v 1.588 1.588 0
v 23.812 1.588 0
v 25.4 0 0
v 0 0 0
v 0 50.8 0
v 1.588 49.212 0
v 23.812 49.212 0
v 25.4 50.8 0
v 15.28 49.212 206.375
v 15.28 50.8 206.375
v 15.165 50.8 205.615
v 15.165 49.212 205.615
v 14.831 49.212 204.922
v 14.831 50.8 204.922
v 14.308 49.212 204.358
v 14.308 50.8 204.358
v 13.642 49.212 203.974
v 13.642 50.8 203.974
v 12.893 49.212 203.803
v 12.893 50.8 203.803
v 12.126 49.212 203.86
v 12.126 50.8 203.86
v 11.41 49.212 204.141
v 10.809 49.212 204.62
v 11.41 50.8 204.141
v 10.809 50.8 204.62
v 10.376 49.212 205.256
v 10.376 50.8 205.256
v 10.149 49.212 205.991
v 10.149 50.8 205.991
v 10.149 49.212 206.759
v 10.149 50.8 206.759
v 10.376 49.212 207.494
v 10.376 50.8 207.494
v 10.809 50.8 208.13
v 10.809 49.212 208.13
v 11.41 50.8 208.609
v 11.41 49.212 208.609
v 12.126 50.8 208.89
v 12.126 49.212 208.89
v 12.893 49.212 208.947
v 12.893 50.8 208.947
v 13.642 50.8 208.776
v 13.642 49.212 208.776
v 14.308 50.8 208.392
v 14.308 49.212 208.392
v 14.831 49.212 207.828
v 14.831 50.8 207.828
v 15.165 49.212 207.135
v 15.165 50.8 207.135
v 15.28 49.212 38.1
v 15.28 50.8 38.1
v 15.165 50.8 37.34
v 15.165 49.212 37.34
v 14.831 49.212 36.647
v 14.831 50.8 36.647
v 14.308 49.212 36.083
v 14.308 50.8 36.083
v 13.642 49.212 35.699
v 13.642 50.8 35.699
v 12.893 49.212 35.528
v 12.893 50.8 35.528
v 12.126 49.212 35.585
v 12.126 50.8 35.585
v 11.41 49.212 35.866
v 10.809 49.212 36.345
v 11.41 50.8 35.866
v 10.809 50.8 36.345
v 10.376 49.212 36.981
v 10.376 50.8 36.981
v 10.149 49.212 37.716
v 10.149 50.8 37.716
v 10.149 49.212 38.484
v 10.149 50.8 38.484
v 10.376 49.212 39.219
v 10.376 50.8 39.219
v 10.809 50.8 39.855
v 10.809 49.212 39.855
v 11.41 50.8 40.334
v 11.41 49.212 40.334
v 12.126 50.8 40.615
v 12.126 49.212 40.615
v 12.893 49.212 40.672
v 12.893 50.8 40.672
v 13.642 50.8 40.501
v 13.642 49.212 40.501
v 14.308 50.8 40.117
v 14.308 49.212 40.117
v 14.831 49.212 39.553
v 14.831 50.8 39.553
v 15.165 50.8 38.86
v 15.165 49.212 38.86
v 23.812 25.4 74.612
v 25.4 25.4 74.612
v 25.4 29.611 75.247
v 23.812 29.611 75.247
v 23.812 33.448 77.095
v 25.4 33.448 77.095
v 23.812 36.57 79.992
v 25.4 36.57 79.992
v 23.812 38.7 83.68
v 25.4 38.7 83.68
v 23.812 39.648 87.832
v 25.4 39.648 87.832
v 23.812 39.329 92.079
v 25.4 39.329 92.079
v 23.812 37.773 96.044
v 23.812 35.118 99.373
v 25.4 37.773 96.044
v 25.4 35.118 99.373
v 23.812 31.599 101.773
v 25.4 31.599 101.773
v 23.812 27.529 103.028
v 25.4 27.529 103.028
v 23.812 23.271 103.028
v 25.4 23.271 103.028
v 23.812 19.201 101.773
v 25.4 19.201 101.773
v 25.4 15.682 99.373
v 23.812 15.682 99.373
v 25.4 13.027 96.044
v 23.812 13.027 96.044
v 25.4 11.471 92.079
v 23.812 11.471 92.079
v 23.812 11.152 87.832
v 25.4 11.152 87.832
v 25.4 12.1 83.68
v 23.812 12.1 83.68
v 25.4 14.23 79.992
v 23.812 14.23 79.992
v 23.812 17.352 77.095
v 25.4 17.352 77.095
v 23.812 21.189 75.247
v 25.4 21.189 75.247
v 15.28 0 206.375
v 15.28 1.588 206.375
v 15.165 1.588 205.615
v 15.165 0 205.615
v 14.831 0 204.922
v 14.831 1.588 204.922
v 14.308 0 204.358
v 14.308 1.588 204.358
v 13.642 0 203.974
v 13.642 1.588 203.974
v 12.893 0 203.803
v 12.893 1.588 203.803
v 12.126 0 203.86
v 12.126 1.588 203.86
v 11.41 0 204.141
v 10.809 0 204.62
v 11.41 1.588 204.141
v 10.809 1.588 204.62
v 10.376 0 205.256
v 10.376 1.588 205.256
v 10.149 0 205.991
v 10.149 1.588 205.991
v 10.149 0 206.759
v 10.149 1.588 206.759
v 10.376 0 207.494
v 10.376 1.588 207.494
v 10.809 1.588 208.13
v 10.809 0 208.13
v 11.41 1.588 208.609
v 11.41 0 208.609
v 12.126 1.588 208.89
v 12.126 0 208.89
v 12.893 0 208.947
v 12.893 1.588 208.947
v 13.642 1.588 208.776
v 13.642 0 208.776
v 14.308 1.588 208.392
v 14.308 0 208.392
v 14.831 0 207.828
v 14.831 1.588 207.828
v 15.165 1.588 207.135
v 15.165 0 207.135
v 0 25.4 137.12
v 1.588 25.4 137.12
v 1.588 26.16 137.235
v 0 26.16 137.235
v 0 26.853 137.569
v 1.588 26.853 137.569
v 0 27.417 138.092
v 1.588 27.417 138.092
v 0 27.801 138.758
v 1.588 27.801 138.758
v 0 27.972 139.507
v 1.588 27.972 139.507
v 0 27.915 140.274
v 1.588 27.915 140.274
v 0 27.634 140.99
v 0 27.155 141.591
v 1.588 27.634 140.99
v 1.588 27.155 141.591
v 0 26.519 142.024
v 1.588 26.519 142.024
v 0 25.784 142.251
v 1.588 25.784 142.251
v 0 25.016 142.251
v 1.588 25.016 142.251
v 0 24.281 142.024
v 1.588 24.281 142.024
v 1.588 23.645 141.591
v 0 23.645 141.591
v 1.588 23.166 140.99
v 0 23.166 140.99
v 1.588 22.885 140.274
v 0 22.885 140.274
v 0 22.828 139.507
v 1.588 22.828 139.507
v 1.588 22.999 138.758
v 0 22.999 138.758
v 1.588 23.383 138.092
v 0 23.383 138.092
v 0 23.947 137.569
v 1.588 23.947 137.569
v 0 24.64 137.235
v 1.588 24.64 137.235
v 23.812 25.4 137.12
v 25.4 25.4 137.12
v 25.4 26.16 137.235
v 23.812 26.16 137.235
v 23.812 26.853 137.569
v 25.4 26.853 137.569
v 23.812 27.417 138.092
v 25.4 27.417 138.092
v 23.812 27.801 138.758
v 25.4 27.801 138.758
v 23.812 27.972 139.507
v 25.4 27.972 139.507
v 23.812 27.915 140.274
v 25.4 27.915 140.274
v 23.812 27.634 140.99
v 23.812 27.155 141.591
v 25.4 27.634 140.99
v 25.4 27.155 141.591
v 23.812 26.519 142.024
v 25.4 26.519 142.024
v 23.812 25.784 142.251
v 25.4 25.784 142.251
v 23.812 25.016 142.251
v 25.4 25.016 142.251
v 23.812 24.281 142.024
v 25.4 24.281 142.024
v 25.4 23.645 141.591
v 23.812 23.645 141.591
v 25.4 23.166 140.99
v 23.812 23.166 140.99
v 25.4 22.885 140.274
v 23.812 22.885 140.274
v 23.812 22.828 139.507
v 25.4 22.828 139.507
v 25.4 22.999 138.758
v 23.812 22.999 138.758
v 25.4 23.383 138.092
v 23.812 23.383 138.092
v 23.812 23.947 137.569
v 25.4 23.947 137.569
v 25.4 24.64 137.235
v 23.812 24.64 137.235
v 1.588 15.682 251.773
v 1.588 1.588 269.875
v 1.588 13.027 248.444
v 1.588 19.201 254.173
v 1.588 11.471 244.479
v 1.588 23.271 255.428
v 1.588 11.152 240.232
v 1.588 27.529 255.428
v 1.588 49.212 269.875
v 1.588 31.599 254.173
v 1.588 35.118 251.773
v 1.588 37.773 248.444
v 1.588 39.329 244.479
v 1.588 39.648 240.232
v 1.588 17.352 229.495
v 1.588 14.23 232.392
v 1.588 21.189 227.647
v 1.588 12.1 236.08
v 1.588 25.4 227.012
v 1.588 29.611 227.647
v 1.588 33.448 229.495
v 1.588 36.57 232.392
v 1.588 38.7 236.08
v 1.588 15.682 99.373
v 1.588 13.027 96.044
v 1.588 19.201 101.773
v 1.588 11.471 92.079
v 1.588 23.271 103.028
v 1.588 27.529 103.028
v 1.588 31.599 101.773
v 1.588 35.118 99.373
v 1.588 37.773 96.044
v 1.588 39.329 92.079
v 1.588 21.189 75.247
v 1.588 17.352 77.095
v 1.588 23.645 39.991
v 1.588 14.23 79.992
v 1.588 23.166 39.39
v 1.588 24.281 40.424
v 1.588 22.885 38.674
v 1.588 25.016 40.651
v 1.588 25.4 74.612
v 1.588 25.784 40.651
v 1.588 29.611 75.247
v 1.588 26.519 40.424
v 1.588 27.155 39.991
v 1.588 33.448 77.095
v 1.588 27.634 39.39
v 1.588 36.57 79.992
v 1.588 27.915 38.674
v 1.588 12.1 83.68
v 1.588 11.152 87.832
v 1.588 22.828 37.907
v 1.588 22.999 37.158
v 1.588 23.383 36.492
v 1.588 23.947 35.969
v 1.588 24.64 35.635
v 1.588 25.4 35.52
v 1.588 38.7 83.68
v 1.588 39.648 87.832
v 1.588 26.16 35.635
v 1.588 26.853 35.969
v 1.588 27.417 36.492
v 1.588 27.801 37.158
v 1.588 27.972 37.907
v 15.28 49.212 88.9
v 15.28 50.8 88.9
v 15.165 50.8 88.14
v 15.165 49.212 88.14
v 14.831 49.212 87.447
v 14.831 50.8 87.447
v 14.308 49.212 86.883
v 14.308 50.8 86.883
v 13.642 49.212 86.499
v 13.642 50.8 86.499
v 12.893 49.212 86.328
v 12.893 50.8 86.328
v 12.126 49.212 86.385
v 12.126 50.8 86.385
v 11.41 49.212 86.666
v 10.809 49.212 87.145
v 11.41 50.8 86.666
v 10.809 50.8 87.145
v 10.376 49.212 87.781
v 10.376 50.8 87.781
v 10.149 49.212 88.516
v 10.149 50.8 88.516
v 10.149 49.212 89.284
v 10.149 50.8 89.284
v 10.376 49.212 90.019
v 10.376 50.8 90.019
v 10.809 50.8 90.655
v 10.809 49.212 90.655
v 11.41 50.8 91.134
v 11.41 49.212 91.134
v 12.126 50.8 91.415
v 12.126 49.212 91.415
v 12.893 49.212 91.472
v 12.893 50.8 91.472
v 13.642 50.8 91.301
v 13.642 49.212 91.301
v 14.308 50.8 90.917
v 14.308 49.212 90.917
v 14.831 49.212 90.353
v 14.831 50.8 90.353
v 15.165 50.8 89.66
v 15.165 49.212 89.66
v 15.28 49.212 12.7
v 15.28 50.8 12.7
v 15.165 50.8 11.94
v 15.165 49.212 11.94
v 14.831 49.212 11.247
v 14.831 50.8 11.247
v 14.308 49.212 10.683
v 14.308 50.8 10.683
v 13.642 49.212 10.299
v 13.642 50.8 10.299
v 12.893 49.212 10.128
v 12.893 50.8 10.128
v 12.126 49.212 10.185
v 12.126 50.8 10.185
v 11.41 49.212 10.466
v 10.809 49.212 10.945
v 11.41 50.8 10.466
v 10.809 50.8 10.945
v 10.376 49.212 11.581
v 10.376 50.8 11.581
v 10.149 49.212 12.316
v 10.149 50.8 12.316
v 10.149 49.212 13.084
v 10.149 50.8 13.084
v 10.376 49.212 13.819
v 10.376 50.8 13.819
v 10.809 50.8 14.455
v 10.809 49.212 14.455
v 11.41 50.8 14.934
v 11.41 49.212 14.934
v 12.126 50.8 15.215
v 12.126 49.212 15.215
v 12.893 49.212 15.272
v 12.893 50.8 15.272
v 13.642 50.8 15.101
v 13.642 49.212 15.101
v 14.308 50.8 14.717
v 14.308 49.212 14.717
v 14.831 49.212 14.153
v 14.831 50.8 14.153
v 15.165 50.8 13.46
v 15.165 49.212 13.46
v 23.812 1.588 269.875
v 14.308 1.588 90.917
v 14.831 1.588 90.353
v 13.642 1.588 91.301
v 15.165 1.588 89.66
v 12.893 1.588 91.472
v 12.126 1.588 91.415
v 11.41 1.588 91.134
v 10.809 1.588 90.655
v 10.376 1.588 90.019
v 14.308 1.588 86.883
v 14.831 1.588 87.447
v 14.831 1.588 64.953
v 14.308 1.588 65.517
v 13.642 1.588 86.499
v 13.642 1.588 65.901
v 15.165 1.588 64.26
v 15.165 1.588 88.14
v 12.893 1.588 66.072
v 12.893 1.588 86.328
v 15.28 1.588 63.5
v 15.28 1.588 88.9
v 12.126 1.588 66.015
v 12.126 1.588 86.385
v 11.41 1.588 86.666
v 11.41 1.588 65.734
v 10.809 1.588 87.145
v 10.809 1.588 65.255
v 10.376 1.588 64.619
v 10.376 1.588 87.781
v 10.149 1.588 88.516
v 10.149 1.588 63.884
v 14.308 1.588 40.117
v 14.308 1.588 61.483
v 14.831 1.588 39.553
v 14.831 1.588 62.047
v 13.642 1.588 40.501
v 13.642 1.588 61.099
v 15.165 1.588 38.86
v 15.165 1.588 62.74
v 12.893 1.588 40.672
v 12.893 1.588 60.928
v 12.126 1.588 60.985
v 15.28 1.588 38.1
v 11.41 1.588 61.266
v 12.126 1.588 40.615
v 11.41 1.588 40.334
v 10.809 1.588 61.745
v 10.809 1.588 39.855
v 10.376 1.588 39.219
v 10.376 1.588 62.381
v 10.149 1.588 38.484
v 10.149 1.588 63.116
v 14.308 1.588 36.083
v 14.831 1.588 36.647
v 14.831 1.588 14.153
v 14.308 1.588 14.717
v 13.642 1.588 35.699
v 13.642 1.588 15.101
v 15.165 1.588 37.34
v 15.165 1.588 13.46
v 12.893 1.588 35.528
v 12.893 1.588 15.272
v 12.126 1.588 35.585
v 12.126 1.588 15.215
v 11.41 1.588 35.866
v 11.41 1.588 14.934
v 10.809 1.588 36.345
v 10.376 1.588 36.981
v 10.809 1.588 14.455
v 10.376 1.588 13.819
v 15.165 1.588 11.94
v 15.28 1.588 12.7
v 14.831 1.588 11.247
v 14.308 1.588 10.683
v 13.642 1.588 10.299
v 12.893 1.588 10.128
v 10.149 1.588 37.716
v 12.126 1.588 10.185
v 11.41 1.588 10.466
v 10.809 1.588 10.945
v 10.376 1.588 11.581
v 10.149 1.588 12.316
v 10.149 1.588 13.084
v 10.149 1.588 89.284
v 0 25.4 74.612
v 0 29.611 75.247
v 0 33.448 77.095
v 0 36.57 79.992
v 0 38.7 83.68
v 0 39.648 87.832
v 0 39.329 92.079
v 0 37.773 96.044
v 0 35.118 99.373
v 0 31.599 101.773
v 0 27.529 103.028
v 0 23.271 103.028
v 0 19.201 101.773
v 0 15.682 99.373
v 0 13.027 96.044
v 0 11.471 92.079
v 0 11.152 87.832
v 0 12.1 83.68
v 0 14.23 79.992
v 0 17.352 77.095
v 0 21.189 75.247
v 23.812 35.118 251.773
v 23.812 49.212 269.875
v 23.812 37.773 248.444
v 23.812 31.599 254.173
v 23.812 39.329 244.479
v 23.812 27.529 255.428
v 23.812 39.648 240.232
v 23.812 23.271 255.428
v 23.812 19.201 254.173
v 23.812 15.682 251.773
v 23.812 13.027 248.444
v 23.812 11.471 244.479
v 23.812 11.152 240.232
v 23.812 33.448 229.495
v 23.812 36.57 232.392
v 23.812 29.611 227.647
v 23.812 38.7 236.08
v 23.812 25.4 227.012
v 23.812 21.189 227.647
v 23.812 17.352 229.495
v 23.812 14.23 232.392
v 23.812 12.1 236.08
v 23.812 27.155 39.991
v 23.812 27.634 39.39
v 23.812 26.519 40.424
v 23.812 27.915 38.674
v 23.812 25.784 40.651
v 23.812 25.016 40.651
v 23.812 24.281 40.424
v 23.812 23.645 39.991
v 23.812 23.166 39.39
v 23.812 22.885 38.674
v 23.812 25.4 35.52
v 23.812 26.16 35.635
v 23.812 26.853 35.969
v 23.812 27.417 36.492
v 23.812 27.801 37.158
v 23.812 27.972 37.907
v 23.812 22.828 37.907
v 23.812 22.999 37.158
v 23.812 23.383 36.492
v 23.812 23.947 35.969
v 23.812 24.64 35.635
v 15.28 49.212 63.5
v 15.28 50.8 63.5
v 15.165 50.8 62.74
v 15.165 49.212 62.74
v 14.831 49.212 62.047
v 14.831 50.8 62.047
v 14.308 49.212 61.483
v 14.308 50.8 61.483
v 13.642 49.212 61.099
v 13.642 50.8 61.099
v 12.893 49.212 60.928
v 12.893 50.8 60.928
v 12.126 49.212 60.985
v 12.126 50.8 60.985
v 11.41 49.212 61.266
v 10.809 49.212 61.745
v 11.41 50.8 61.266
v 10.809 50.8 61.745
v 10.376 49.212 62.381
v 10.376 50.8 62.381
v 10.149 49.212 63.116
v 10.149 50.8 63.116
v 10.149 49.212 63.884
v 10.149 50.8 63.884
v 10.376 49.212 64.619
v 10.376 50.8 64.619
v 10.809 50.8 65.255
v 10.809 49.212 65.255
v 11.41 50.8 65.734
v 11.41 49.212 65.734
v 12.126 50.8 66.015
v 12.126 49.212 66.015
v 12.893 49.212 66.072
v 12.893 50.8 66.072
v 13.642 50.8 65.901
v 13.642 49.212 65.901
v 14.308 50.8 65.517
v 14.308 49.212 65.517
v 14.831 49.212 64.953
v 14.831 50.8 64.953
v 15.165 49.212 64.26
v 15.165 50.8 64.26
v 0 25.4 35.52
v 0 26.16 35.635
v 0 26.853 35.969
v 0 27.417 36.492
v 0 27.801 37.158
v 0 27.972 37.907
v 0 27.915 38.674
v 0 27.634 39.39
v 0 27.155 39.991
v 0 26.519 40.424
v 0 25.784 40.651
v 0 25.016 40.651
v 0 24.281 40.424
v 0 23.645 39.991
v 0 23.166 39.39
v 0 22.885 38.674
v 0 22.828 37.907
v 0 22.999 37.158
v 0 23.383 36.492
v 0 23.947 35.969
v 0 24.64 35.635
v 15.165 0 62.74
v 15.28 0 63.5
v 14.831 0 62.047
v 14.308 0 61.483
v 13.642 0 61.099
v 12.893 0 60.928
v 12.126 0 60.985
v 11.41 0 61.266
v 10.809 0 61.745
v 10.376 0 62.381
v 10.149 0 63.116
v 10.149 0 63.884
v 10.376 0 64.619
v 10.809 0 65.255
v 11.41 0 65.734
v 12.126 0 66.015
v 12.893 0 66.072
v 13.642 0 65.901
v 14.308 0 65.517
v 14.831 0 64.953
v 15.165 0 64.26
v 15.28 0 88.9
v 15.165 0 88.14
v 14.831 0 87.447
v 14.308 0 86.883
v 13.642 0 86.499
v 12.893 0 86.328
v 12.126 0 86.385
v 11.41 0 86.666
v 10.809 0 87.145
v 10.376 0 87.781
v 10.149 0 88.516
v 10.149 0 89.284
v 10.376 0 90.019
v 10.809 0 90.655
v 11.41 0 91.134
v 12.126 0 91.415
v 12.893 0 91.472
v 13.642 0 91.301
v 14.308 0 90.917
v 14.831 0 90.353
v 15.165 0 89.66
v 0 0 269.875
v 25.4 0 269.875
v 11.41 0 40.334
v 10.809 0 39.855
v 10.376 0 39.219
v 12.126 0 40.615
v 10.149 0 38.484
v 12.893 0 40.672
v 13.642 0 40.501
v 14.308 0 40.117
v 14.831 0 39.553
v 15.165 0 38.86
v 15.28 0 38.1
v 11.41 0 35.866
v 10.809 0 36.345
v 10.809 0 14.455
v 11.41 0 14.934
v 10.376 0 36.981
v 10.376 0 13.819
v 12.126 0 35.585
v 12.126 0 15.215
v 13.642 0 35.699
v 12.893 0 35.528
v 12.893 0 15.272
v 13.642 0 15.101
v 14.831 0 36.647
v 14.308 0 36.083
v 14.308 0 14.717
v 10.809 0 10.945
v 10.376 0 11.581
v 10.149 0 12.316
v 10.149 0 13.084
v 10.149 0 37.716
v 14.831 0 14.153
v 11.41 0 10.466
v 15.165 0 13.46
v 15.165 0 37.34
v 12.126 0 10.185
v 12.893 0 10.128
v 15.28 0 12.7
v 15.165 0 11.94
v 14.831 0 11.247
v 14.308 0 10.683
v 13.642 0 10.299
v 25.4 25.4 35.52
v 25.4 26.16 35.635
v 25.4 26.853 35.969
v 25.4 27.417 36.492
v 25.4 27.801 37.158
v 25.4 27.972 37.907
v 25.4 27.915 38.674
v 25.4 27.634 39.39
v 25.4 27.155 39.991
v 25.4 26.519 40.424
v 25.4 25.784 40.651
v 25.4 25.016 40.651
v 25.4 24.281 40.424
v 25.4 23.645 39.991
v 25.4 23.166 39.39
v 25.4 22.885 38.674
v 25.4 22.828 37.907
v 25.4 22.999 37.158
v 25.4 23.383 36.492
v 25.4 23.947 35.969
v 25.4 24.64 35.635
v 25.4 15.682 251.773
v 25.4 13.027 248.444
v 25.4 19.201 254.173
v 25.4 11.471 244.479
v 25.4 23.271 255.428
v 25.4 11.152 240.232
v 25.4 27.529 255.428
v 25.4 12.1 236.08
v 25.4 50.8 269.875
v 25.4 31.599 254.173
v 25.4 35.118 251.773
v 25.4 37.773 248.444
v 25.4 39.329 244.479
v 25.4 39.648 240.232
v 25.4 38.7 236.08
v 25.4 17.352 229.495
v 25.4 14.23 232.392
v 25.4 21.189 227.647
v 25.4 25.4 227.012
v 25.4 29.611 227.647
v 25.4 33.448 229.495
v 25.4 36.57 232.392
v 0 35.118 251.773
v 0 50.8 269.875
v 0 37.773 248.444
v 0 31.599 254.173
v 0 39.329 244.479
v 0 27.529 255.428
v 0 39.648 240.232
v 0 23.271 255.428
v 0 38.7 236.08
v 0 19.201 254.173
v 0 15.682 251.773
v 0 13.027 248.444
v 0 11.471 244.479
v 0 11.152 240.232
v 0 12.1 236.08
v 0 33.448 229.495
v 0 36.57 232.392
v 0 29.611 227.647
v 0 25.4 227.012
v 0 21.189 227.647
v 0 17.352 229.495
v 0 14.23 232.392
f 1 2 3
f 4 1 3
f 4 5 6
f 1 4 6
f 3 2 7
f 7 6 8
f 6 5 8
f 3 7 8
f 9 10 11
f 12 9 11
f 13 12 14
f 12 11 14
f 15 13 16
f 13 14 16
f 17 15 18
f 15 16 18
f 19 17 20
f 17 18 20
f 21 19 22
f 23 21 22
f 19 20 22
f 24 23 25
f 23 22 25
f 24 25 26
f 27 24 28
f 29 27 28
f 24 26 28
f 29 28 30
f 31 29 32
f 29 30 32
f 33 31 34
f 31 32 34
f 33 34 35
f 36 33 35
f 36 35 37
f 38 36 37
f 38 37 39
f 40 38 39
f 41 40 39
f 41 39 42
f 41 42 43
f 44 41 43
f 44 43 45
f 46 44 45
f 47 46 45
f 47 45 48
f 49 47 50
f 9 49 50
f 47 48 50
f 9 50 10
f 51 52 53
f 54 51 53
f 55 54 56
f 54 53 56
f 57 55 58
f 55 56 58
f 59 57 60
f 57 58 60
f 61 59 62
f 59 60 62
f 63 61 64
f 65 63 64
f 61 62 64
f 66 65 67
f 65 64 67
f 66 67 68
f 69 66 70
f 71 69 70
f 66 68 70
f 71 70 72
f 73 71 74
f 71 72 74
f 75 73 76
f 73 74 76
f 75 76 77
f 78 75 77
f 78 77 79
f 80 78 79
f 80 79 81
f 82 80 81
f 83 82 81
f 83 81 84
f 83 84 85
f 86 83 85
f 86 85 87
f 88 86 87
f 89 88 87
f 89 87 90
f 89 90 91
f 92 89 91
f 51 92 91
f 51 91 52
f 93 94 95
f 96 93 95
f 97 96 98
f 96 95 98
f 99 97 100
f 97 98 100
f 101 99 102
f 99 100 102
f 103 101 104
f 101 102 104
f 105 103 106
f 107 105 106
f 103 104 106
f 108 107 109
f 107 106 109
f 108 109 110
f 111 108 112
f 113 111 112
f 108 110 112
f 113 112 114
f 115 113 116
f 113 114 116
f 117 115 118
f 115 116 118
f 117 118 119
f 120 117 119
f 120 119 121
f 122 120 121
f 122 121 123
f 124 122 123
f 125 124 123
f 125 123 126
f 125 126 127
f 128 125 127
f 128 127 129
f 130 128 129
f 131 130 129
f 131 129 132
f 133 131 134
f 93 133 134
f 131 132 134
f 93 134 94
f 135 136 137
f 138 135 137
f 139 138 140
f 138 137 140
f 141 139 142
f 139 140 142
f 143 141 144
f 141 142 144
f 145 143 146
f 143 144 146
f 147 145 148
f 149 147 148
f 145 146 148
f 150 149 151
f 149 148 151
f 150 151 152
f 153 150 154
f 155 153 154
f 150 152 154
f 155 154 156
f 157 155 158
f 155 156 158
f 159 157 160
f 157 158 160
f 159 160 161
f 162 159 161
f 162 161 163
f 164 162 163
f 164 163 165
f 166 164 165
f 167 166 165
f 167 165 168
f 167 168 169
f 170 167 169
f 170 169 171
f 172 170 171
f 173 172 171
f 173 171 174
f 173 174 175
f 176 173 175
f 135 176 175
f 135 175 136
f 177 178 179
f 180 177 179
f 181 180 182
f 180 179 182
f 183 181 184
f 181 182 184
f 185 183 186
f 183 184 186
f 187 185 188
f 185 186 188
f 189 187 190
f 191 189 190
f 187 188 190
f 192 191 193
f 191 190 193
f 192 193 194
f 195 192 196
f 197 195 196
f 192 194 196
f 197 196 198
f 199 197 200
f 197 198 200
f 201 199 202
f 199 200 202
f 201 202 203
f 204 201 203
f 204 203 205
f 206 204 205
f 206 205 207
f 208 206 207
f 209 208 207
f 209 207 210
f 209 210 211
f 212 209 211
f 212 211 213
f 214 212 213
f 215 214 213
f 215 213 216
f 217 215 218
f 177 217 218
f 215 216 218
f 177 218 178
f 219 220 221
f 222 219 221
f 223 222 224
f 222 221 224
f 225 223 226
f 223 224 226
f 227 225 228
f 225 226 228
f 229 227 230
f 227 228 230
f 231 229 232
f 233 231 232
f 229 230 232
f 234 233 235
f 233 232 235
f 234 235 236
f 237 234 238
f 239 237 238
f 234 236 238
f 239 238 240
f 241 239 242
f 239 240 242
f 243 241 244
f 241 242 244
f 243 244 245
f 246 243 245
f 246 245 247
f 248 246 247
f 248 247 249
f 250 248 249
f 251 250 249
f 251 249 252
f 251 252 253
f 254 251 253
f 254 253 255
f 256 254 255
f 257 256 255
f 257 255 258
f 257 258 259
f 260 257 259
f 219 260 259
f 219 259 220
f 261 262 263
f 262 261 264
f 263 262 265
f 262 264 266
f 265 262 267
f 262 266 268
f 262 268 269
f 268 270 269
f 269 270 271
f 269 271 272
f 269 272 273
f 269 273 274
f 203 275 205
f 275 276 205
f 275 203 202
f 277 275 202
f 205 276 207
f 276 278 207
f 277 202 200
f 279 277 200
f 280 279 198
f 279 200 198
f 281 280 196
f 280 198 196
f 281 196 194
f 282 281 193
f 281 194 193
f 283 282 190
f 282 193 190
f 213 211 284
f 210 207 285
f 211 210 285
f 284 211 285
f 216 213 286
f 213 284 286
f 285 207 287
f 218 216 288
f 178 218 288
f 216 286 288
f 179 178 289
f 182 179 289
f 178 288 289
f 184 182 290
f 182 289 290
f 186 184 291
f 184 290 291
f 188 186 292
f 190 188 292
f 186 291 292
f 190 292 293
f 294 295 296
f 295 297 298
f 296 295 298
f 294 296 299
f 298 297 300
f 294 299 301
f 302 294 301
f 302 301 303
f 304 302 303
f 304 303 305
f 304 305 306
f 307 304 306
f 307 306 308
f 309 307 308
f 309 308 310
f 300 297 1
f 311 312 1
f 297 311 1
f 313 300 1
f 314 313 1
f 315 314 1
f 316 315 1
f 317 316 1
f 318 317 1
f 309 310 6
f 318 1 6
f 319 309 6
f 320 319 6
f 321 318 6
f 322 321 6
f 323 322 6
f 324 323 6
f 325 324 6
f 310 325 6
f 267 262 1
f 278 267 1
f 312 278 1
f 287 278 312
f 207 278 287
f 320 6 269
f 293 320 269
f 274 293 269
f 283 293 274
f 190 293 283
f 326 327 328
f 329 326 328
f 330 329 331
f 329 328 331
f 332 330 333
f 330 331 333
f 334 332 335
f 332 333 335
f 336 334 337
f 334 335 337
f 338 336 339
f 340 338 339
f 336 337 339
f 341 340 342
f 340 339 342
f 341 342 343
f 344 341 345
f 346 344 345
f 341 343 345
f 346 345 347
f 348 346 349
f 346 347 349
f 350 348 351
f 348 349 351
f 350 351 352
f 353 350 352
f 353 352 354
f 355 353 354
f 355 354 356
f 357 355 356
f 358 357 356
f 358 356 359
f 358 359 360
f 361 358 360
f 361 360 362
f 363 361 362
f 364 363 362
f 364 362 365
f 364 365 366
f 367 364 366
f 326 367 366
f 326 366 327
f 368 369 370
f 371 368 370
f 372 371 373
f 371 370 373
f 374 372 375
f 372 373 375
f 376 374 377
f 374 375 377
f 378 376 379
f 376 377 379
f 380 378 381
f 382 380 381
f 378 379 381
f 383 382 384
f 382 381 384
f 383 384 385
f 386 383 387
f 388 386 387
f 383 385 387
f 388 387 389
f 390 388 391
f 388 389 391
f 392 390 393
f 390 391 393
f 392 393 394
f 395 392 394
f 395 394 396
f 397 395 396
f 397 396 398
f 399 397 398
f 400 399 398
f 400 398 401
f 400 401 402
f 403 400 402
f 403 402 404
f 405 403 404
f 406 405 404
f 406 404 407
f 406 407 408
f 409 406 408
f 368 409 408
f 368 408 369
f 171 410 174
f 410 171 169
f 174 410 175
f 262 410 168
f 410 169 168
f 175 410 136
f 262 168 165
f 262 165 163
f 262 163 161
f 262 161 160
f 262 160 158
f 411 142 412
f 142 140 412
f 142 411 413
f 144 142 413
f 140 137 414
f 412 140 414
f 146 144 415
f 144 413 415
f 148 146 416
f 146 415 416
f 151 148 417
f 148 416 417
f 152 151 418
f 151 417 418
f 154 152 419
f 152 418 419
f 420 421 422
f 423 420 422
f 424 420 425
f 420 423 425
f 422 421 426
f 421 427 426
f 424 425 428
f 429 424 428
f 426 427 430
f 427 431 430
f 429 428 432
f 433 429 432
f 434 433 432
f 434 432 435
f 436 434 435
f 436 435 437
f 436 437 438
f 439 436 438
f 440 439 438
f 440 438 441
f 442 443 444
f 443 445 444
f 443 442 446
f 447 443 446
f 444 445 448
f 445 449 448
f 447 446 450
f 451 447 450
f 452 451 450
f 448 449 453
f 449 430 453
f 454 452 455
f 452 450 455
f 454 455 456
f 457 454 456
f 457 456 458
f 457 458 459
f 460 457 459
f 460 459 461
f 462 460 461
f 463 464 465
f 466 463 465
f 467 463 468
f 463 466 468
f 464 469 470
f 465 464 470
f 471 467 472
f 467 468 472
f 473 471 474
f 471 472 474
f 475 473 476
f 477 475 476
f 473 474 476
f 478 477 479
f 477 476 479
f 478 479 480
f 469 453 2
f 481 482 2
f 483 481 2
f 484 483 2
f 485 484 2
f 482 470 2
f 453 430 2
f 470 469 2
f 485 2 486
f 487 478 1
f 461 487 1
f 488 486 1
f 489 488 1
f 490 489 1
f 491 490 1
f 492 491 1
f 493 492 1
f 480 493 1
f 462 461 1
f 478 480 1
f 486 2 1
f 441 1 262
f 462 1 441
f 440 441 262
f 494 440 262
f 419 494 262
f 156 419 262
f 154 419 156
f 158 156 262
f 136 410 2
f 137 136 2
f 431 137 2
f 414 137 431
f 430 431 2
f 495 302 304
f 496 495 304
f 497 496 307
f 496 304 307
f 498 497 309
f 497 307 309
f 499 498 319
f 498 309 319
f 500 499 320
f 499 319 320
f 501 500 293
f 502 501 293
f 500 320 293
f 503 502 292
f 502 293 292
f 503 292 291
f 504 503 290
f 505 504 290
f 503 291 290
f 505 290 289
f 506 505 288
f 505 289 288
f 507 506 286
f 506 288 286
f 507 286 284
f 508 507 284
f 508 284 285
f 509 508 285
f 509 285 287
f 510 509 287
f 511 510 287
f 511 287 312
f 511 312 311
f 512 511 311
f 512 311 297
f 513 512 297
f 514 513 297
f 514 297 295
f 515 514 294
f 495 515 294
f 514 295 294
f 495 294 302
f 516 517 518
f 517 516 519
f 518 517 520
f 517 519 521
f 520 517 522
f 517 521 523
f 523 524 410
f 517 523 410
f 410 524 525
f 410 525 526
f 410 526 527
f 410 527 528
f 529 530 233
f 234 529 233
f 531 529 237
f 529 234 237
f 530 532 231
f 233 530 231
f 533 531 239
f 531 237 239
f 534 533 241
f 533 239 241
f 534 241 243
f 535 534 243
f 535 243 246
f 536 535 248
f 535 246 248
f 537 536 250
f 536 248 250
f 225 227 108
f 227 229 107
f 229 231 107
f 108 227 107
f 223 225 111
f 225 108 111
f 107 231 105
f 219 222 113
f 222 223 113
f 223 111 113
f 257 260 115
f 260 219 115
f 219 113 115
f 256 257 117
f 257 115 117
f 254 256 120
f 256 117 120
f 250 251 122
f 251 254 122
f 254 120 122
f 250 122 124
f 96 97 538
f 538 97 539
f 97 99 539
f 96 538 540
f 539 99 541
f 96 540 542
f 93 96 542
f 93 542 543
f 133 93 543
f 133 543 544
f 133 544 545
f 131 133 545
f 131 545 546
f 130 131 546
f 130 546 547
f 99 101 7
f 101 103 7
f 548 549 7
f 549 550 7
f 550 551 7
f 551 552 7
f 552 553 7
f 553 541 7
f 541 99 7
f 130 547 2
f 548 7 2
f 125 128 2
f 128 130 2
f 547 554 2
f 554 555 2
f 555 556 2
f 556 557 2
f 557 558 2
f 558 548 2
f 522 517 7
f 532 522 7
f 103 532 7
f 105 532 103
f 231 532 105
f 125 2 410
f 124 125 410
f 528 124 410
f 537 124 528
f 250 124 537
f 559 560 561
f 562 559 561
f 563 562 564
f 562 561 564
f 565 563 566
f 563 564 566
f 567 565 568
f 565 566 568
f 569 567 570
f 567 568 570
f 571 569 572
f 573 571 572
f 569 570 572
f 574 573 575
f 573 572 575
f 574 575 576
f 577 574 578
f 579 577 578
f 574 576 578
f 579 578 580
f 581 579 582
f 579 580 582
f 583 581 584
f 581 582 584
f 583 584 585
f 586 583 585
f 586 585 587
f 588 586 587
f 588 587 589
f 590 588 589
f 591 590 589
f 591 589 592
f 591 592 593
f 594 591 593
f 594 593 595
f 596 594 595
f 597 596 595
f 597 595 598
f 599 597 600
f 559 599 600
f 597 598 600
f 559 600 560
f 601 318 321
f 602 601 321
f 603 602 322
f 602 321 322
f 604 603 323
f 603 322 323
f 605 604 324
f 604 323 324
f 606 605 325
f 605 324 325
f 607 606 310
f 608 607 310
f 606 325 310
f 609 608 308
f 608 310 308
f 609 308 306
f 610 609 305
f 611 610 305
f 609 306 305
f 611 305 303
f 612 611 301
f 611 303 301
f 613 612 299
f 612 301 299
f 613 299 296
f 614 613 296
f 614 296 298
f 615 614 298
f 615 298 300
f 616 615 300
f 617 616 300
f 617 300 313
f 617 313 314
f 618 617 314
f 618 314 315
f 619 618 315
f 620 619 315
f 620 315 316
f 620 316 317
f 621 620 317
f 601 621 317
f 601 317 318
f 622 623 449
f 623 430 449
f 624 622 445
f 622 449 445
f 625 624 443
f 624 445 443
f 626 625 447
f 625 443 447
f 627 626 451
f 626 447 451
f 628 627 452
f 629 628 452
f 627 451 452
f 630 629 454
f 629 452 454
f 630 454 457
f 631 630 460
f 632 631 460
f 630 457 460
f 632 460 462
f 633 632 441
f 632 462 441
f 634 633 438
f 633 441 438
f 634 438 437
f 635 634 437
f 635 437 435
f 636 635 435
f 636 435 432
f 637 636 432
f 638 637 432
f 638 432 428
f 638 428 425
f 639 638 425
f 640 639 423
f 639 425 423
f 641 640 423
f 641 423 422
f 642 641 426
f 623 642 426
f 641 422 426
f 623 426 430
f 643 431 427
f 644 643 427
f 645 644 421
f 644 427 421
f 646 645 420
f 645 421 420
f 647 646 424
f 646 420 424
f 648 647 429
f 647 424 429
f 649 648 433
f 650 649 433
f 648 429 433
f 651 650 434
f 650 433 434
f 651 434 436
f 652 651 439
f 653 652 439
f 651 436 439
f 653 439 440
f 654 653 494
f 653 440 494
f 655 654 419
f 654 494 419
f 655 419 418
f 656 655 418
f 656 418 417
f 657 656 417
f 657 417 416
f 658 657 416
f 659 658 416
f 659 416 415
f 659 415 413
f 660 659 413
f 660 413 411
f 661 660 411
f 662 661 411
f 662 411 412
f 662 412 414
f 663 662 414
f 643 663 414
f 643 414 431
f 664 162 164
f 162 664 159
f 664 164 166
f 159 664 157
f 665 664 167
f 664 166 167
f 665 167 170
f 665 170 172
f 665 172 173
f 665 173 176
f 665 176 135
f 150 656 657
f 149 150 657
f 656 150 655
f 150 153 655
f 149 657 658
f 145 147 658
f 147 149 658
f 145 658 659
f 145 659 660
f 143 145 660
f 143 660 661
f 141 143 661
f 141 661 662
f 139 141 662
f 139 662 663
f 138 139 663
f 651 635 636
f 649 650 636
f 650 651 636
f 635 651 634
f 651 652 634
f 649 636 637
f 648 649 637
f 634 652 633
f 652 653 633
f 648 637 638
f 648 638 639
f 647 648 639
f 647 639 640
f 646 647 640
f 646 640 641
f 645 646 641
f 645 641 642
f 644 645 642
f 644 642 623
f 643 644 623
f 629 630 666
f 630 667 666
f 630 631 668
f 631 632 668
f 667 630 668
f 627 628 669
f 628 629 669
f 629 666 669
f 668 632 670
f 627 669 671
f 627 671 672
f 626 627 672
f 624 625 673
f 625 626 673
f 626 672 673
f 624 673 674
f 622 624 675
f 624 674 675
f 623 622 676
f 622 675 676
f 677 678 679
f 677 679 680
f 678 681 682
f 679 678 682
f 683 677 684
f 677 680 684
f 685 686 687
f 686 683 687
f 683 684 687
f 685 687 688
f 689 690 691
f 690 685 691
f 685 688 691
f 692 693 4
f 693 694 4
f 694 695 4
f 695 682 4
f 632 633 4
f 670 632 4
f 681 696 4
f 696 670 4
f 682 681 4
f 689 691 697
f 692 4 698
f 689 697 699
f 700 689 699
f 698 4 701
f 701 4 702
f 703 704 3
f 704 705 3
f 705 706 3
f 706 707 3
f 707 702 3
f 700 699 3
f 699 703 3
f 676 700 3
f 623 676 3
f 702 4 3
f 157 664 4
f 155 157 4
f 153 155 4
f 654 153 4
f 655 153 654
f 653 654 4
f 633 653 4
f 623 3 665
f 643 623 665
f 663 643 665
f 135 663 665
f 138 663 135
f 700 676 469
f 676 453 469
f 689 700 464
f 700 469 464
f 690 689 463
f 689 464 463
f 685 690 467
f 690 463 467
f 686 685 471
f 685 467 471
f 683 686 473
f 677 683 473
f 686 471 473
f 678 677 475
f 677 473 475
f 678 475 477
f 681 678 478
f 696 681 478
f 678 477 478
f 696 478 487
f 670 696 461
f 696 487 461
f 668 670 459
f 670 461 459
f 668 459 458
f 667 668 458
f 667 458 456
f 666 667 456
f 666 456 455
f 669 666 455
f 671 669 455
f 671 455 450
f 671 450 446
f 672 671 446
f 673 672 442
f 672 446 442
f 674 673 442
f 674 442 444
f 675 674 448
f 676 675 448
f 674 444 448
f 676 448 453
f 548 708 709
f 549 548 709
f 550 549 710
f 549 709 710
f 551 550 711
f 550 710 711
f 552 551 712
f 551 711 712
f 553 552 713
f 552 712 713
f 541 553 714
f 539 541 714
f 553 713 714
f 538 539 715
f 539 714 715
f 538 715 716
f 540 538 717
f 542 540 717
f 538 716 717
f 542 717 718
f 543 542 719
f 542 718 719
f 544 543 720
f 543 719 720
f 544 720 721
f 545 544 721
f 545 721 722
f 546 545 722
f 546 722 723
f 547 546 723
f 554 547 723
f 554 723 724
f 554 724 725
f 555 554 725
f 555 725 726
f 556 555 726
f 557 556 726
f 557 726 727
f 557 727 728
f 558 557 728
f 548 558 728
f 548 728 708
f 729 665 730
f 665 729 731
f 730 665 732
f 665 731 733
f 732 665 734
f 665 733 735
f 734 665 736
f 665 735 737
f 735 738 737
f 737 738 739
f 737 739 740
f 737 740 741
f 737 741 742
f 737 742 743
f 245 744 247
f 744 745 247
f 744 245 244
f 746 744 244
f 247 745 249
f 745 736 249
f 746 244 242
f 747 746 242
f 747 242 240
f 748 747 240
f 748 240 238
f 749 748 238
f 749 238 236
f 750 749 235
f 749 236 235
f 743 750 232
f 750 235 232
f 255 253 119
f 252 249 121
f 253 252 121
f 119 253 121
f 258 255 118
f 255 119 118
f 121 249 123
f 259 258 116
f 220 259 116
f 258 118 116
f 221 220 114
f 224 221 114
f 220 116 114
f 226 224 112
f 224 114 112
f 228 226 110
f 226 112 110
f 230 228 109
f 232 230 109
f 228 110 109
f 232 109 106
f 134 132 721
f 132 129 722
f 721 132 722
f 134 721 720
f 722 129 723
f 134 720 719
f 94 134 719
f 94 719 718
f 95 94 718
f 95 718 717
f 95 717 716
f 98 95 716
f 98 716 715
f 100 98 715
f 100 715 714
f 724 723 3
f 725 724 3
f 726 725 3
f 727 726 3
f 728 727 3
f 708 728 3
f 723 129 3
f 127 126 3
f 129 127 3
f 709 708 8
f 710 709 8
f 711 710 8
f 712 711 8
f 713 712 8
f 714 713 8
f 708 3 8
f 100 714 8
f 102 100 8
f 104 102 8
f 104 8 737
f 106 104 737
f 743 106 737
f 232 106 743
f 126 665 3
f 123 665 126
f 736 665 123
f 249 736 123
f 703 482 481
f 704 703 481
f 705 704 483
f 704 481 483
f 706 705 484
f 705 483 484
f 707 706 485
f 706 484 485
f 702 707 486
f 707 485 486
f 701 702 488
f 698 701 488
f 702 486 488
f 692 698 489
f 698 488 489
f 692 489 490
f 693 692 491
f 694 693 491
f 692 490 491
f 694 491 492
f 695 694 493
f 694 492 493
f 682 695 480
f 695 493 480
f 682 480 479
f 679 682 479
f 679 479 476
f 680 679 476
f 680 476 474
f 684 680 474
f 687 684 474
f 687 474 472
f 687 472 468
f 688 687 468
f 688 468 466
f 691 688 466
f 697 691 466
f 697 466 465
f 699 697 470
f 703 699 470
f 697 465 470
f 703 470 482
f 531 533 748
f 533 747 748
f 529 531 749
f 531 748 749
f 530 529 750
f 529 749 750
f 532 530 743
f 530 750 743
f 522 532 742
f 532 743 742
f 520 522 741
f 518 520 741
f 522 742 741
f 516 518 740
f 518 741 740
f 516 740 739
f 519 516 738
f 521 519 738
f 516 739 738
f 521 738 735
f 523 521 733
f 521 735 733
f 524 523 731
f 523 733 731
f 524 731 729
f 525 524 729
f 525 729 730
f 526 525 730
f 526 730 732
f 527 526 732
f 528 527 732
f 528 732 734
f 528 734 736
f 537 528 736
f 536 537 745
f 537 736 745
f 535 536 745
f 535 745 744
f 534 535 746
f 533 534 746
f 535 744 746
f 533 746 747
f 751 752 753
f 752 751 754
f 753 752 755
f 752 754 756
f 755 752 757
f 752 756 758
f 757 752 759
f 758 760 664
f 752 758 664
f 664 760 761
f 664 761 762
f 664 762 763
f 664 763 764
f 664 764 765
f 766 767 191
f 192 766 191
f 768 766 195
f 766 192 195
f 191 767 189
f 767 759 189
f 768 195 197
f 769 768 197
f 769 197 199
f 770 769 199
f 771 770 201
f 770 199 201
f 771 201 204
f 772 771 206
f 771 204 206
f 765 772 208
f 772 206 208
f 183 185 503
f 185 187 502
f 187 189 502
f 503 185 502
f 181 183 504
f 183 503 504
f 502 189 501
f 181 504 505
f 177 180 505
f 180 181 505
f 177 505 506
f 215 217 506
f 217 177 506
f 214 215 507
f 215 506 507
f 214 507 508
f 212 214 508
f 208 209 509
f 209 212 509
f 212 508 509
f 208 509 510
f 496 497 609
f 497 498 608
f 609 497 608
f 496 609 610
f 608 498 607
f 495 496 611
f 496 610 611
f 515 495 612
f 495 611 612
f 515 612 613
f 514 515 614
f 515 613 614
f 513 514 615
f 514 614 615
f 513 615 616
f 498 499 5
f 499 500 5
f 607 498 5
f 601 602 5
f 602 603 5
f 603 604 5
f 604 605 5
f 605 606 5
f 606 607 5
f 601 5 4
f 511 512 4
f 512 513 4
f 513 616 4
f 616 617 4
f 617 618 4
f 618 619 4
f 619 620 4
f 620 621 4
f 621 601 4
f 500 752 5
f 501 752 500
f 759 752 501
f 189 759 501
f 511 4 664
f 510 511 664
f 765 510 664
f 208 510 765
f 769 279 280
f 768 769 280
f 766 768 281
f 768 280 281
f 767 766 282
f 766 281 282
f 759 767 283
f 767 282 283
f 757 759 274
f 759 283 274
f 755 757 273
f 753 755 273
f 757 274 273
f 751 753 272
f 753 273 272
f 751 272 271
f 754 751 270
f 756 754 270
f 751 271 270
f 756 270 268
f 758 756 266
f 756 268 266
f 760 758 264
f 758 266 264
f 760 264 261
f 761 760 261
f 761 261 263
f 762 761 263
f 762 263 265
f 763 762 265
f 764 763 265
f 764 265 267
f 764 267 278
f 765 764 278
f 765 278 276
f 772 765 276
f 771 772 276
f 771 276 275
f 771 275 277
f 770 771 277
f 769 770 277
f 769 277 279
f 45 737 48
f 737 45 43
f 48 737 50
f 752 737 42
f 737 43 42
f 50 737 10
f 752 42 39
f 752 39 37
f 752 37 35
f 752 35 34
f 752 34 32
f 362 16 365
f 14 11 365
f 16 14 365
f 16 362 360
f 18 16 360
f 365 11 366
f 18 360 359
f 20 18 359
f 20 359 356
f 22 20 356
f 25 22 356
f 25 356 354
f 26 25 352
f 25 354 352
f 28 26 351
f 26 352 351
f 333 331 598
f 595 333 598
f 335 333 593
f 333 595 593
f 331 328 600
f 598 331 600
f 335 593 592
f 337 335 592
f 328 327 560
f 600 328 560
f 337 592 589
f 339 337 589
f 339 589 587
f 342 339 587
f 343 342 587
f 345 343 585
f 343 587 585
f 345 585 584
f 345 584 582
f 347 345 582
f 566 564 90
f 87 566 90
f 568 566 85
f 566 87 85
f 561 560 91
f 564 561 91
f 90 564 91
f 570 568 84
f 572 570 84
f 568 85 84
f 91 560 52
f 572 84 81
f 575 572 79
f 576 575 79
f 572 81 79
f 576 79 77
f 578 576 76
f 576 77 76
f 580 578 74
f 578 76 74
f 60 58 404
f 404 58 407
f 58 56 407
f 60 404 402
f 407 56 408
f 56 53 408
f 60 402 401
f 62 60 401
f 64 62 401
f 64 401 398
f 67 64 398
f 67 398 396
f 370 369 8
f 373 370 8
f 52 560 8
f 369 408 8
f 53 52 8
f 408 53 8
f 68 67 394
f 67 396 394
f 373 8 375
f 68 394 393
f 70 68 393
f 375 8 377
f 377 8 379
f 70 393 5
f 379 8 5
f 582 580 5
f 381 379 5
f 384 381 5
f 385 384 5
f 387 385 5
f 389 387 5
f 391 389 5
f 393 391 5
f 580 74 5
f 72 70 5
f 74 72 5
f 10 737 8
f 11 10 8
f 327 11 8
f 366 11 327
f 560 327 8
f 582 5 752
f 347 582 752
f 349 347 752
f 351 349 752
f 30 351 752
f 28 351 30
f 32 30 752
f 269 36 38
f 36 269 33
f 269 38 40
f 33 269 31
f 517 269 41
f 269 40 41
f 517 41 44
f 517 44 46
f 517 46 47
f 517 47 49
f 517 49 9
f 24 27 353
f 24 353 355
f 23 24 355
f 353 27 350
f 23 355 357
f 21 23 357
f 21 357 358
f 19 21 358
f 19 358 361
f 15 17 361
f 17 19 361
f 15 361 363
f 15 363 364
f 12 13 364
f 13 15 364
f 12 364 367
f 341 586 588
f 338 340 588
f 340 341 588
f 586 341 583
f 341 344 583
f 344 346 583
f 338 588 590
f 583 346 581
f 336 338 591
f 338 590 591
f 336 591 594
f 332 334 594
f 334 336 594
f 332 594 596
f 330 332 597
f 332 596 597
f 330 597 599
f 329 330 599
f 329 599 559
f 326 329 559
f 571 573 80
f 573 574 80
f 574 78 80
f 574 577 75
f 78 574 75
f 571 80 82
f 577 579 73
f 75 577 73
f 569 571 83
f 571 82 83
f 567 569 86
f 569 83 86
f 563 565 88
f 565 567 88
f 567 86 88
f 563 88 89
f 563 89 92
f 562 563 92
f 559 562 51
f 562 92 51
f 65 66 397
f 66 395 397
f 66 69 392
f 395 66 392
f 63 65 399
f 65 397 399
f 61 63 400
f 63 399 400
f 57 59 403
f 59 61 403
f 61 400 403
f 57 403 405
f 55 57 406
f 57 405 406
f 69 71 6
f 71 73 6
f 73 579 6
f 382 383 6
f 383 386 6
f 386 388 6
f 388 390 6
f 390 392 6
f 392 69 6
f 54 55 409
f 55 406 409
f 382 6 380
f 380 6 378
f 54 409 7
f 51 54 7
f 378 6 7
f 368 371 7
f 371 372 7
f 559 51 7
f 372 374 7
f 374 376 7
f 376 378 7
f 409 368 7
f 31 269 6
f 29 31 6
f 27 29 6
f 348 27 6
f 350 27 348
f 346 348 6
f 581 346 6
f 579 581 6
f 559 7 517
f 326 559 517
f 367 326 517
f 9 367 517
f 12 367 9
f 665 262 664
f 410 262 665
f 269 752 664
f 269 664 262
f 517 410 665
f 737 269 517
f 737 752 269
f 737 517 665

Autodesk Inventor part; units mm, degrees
ref_plane "YZ Plane" through (0, 0, 0) normal (1, 0, 0) x (0, 1, 0)
ref_plane "XZ Plane" through (0, 0, 0) normal (0, 1, 0) x (-1, 0, 0)
ref_plane "XY Plane" through (0, 0, 0) normal (0, 0, 1) x (1, 0, 0)
sketch "Sketch1" plane through (0, 0, 0) normal (0, 0, 1) x (1, 0, 0)
  line L0 (0, 0) -> (25.4, 0)
  line L1 (25.4, 0) -> (25.4, 50.8)
  line L2 (25.4, 50.8) -> (0, 50.8)
  line L3 (0, 50.8) -> (0, 0)
  line L4 (1.5875, 49.2125) -> (23.8125, 49.2125)
  line L5 (23.8125, 49.2125) -> (23.8125, 1.5875)
  line L6 (23.8125, 1.5875) -> (1.5875, 1.5875)
  line L7 (1.5875, 1.5875) -> (1.5875, 49.2125)
  dimension "d0" = 25.4
  dimension "d1" = 50.8
  dimension "d2" = 1.5875
extrude "Extrusion1" add sketch "Sketch1" along normal blind 269.875
sketch "Sketch2" plane through (25.4, 0, 0) normal (1, 0, 0) x (0, 0, -1)
  line L0 (-269.875, 49.2125) -> (-269.875, 1.5875) construction
  line L1 (-269.875, 25.4) -> (-241.3, 25.4) construction
  circle A0 centre (-241.3, 25.4) radius 14.2875
  point P0 (0, 0)
  dimension "d20" = 28.575
  dimension "d21" = 28.575
sketch "Sketch4" plane through (0, 50.8, 0) normal (0, 1, 0) x (1, 0, 0)
  line L0 (1.5875, 0) -> (23.8125, 0) construction
  line L1 (12.7, 0) -> (12.7, -12.7) construction
  line L2 (12.7, -12.7) -> (12.7, -38.1) construction
  line L3 (12.7, -38.1) -> (12.7, -63.5) construction
  circle A0 centre (12.7, -12.7) radius 2.5797
  circle A1 centre (12.7, -38.1) radius 2.5797
  circle A2 centre (12.7, -63.5) radius 2.5797
  point P0 (0, 0)
  dimension "d14" = 12.7
  dimension "d15" = 25.4
  dimension "d16" = 25.4
  dimension "d17" = 5.1594
extrude "Extrusion4" cut sketch "Sketch4" against normal blind 68.2625
extrude "Extrusion5" cut sketch "Sketch2" against normal blind 25.4
sketch "Sketch5" plane through (25.4, 0, 0) normal (1, 0, 0) x (0, 0, -1)
  line L0 (0, 1.5875) -> (0, 49.2125) construction
  line L1 (0, 25.4) -> (-38.1, 25.4) construction
  line L2 (0, 25.4) -> (38.1, 25.4) construction
  line L3 (-38.1, 25.4) -> (-139.7, 25.4) construction
  circle A0 centre (-139.7, 25.4) radius 2.5797
  circle A1 centre (-38.1, 25.4) radius 2.5797
  circle A2 centre (-88.9, 25.4) radius 14.2875
  point P0 (0, 0)
  dimension "d24" = 38.1
  dimension "d25" = 180
  dimension "d26" = 101.6
  dimension "d27" = 5.1594
  dimension "d30" = 28.575
extrude "Extrusion7" cut sketch "Sketch5" against normal blind 25.4
sketch "Sketch7" plane through (0, 50.8, 0) normal (0, 1, 0) x (1, 0, 0)
  circle A0 centre (12.7, -63.5) radius 2.5797 construction
  line L0 (12.7, -63.5) -> (12.7, -88.9) construction
  circle A1 centre (12.7, -88.9) radius 2.5797
  point P0 (0, 0)
  dimension "d37" = 25.4
extrude "Extrusion9" cut sketch "Sketch7" against normal blind 66.675
sketch "Sketch8" plane through (0, 50.8, 0) normal (0, 1, 0) x (1, 0, 0)
  line L0 (23.8125, -269.875) -> (1.5875, -269.875) construction
  line L1 (12.7, -269.875) -> (12.7, -206.375) construction
  circle A0 centre (12.7, -206.375) radius 2.5797
  point P0 (0, 0)
  dimension "d40" = 63.5
  dimension "d41" = 5.1594
extrude "Extrusion10" cut sketch "Sketch8" against normal blind 66.675
